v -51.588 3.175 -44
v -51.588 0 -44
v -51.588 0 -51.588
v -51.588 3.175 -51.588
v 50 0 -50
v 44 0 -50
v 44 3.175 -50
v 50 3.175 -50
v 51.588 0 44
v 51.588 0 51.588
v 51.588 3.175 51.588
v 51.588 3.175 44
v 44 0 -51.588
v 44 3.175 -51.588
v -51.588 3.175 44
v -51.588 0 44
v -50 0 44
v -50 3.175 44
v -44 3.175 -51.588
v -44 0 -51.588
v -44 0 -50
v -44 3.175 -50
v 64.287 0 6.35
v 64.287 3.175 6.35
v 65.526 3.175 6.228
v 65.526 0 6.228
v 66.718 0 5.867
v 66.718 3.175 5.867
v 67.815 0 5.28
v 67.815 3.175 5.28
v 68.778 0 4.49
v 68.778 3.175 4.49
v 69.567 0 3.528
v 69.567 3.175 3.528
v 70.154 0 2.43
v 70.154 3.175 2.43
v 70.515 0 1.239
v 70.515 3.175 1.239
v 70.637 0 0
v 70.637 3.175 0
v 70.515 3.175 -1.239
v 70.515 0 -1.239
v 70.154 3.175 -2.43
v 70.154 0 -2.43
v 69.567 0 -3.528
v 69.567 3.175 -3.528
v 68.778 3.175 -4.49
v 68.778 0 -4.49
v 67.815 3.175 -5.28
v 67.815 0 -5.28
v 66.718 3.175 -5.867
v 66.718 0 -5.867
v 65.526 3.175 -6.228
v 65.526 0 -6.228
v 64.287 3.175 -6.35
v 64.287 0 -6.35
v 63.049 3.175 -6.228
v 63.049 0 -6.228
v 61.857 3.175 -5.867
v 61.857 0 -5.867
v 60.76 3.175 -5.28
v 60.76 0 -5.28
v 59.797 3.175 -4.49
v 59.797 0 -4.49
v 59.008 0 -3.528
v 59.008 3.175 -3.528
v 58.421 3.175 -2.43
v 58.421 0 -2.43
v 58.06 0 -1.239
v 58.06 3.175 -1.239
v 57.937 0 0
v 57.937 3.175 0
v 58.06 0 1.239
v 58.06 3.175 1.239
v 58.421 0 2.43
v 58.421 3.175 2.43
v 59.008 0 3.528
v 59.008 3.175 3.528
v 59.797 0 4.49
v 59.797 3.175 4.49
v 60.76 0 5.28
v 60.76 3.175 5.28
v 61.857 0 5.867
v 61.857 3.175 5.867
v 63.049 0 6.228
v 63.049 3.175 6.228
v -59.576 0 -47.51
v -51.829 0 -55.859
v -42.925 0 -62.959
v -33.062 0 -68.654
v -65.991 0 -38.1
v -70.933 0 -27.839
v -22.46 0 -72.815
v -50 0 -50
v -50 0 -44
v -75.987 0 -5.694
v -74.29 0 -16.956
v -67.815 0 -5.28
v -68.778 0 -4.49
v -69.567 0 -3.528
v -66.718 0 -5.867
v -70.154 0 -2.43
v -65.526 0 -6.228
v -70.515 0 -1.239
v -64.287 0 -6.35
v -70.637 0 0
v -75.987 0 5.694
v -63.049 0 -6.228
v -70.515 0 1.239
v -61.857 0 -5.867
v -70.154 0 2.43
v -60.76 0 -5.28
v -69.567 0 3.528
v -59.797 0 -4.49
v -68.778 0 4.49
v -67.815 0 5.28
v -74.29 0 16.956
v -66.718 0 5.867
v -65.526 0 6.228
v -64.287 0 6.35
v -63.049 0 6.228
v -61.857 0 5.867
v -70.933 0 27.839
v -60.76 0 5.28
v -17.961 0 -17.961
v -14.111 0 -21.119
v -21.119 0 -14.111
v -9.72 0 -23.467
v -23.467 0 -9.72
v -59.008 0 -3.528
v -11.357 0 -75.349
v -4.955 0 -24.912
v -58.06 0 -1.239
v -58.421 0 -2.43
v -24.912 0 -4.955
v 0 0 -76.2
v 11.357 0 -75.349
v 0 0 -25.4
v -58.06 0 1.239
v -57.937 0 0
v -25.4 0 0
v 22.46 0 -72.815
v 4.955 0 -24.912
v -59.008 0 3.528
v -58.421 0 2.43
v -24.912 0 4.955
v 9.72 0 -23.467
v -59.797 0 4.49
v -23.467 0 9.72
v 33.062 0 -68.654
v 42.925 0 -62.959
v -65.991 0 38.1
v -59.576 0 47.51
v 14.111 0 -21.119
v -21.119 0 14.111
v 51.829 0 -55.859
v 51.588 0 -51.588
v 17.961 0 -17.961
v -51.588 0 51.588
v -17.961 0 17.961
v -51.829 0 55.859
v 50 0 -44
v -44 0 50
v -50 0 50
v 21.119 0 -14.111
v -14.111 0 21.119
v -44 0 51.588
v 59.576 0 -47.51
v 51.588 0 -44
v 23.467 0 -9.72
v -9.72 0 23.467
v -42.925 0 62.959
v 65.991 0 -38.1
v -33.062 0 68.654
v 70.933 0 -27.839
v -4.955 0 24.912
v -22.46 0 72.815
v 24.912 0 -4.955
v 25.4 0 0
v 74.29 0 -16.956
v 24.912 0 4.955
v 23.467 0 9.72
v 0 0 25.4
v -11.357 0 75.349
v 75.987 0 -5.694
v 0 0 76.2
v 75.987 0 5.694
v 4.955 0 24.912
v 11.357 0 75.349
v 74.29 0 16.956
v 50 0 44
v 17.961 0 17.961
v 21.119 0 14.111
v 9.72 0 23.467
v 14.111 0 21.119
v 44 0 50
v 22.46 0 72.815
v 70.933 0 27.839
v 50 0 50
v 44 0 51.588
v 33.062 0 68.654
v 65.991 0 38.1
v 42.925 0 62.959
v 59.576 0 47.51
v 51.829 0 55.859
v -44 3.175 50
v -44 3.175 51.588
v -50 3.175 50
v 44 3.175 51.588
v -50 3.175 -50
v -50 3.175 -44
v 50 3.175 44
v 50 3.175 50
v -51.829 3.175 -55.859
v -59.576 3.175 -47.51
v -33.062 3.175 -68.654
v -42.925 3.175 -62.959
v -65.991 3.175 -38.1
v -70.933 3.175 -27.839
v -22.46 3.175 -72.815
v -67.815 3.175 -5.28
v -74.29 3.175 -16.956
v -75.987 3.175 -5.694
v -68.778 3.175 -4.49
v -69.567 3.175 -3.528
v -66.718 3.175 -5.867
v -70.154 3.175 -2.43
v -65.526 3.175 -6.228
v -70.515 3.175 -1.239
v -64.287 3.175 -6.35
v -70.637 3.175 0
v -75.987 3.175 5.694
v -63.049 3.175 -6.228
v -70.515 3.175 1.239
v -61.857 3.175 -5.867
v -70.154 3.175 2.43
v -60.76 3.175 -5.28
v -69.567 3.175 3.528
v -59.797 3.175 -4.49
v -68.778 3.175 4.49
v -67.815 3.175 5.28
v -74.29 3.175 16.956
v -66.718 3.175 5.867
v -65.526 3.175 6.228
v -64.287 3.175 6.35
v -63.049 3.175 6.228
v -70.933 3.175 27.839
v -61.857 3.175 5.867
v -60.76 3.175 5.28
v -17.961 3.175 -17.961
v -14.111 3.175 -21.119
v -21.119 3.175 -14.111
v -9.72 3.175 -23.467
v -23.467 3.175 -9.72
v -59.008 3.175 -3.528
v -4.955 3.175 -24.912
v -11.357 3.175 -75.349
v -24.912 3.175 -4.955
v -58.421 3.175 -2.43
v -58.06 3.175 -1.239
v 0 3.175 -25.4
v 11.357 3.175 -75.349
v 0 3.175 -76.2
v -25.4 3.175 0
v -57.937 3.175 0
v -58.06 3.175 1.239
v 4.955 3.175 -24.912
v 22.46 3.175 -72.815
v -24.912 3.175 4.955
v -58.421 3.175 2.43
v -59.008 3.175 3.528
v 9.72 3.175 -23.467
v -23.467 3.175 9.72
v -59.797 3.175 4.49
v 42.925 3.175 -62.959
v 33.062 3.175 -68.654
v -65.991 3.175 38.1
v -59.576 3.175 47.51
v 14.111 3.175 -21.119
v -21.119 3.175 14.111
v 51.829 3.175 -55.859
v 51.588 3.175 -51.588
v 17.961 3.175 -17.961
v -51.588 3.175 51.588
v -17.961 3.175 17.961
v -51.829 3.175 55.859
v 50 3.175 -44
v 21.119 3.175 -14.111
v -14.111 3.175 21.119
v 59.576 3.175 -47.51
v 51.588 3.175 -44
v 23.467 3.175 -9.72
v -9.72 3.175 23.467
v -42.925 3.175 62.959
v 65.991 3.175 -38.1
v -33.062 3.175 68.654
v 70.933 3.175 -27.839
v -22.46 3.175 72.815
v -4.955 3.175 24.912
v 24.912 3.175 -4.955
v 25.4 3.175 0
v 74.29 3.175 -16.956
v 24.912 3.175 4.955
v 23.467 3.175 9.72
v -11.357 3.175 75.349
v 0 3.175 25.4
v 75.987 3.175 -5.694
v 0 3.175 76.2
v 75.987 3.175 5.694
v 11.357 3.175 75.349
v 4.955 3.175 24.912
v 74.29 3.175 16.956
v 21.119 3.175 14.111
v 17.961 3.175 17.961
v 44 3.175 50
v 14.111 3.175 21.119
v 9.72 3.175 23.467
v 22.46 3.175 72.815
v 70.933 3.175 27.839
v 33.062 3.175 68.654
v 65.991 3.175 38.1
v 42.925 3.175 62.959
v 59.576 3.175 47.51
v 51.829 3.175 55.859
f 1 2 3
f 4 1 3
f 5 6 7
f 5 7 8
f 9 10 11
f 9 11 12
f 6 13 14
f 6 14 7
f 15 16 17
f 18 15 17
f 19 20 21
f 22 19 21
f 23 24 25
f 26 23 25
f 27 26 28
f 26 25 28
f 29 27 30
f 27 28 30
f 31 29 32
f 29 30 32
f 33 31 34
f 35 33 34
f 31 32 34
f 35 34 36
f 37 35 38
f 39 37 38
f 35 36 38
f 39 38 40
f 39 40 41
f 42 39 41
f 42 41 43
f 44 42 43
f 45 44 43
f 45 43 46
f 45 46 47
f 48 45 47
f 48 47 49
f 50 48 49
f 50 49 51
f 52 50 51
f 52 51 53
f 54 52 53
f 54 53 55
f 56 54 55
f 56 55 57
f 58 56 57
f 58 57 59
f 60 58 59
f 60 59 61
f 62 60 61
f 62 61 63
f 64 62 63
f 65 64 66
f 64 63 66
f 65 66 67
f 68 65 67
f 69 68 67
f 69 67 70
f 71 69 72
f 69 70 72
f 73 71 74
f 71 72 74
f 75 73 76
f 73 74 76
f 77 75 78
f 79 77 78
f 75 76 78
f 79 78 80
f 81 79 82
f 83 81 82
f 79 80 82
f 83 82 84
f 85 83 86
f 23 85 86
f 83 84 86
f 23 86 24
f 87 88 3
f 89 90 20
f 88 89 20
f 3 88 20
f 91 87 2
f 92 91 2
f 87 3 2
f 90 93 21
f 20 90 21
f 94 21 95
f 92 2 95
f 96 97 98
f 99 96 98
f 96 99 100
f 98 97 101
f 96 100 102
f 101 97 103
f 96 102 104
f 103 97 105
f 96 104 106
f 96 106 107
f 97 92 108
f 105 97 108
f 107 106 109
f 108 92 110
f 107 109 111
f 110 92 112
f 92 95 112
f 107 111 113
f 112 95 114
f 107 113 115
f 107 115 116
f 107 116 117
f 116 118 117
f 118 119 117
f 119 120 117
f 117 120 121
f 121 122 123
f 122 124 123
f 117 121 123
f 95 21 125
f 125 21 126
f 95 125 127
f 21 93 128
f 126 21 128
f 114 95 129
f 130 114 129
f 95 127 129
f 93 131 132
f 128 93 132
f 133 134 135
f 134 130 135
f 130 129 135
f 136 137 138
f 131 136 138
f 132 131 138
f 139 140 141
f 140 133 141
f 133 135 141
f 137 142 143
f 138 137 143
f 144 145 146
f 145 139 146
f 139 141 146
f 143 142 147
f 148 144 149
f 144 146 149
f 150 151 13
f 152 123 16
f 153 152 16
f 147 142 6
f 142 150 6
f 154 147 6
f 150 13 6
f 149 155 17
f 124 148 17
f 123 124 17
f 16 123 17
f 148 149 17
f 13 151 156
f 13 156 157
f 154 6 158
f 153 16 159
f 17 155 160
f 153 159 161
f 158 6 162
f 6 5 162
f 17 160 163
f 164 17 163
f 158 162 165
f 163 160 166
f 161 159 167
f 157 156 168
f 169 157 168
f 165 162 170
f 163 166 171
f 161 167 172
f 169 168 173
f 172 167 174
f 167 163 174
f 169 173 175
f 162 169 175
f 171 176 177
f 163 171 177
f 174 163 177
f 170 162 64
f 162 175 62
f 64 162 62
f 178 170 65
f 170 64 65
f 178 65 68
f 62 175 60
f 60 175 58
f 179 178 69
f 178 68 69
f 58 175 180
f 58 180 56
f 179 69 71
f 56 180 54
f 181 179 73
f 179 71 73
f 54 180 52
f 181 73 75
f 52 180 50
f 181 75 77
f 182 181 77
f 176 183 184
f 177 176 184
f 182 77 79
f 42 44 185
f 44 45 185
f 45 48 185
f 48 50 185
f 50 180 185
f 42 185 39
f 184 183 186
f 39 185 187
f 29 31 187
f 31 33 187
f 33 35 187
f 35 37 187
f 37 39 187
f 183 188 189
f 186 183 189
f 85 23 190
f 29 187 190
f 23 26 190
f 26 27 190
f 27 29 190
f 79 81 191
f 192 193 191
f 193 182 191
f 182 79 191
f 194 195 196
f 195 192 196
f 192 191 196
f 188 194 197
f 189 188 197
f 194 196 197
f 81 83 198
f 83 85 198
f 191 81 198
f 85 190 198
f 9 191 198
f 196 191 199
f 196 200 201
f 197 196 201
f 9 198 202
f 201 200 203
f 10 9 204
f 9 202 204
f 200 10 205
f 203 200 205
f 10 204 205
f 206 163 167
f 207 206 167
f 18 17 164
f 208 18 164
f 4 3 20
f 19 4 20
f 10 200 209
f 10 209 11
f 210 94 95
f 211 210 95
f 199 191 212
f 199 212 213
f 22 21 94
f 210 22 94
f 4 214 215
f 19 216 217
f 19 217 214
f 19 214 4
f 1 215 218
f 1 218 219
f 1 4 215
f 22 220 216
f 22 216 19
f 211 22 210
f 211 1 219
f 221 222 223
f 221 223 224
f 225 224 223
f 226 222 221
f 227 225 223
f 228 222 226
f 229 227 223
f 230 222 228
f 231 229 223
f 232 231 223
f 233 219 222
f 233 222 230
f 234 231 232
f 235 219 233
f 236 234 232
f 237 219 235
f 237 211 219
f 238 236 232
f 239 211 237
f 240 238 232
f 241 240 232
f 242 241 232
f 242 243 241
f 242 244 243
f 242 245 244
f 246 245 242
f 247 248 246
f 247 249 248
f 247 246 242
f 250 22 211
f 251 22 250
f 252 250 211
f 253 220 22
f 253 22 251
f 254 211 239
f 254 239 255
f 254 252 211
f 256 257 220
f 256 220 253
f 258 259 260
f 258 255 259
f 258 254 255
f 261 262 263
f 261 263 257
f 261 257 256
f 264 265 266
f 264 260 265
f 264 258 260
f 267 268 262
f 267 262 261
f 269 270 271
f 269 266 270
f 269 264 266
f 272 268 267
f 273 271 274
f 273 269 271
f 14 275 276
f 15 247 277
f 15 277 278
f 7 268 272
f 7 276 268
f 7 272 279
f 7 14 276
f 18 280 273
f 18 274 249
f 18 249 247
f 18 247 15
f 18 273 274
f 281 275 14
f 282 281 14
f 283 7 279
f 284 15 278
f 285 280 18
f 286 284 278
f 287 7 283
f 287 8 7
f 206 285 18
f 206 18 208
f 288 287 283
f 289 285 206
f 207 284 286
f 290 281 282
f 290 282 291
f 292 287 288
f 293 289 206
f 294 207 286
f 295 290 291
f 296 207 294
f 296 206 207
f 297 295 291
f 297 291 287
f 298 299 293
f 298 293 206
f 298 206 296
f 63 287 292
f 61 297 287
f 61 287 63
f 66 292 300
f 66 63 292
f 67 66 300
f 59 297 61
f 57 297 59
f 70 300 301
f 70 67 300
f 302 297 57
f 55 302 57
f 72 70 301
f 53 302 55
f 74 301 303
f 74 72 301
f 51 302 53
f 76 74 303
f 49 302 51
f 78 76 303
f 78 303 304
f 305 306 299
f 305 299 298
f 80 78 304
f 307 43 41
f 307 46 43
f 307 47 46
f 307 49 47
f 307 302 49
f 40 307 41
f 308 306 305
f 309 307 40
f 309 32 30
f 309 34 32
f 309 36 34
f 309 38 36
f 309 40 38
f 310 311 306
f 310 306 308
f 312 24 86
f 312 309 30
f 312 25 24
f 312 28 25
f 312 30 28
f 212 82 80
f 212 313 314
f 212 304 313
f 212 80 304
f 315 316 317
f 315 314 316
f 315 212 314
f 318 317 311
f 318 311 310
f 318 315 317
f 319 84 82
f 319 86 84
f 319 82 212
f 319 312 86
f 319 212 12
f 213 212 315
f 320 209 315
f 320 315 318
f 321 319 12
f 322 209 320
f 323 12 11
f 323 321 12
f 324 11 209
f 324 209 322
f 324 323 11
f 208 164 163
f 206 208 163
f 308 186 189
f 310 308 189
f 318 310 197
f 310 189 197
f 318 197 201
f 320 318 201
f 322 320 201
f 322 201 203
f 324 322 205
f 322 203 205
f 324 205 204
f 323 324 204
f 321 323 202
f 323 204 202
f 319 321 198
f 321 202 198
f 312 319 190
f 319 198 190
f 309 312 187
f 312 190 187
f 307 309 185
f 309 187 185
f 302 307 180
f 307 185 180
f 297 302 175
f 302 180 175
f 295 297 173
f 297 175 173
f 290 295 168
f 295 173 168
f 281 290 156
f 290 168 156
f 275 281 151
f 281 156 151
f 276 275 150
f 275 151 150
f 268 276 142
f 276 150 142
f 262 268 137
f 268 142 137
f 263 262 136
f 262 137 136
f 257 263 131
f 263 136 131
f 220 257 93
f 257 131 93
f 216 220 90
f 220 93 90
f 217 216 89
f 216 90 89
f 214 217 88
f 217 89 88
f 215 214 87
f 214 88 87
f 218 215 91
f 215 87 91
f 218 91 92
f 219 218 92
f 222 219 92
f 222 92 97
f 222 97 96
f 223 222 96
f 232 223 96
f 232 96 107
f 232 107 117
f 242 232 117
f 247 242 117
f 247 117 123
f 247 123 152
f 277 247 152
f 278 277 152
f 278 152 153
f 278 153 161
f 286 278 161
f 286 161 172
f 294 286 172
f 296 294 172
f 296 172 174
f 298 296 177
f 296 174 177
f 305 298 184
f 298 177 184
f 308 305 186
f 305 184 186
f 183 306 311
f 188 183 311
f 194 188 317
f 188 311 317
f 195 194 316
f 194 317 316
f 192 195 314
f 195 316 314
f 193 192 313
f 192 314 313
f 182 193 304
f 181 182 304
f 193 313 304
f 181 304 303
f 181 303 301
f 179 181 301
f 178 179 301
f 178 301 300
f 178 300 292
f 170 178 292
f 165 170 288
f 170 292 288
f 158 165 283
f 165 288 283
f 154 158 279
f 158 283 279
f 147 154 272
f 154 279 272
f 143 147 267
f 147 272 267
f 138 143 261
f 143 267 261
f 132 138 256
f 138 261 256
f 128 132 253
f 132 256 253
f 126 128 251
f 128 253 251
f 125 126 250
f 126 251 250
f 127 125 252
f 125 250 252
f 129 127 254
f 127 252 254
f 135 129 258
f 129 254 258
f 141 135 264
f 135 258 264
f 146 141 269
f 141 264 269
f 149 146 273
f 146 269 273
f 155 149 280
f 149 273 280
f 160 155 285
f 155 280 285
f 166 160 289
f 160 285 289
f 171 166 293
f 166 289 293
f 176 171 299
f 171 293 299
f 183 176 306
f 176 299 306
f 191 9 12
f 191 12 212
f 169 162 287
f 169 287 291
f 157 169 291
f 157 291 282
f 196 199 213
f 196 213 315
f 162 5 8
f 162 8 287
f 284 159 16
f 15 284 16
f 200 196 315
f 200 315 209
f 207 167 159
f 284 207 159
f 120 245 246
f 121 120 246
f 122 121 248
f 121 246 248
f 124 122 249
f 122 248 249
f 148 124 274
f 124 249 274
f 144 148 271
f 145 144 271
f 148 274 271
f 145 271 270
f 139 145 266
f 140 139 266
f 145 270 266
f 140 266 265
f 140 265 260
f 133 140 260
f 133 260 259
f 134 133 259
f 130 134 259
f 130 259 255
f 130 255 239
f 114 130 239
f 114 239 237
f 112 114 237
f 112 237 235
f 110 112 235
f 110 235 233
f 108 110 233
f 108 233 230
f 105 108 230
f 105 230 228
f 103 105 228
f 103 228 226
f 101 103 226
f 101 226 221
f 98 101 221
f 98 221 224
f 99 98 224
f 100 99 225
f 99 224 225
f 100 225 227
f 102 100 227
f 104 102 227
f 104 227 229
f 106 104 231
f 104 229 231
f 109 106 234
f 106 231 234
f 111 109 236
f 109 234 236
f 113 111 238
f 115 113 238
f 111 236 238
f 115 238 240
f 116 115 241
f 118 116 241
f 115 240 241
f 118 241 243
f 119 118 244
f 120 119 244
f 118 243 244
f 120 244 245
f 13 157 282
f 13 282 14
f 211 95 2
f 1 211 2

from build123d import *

# Parameters (mm, degrees)
SKETCH1_R           = 76.2
BOSS_EXTRUDE1_DEPTH = 3.175
SKETCH2_R           = 25.4
CUT_EXTRUDE1_DEPTH  = 3.175
SKETCH3_R           = 6.35
CUT_EXTRUDE2_DEPTH  = 10


with BuildPart() as part:
    # Sketch1 → Boss-Extrude1 (new body)
    with BuildSketch(Plane(origin=(0, 0, 0), x_dir=(1, 0, 0), z_dir=(0, 1, 0))):
        with Locations(Location((0, 0, 0), (0, 0, 270))):
            Circle(SKETCH1_R)
        Polygon((-50, 50), (-50, 44), (-51.5875, 44), (-51.5875, 51.5875), (-44, 51.5875), (-44, 50), align=None, mode=Mode.SUBTRACT)
        Polygon((51.5875, -44), (50, -44), (50, -50), (44, -50), (44, -51.5875), (51.5875, -51.5875), align=None, mode=Mode.SUBTRACT)
        Polygon((-50, -50), (-44, -50), (-44, -51.5875), (-51.5875, -51.5875), (-51.5875, -44), (-50, -44), align=None, mode=Mode.SUBTRACT)
        Polygon((51.5875, 51.5875), (44, 51.5875), (44, 50), (50, 50), (50, 44), (51.5875, 44), align=None, mode=Mode.SUBTRACT)
    extrude(amount=BOSS_EXTRUDE1_DEPTH)

    # Sketch2 → Cut-Extrude1 (cut)
    with BuildSketch(Plane(origin=(0, 3.175, 0), x_dir=(1, 0, 0), z_dir=(0, 1, 0))):
        with Locations(Location((0, 0, 0), (0, 0, 270))):
            Circle(SKETCH2_R)
    extrude(amount=-CUT_EXTRUDE1_DEPTH, mode=Mode.SUBTRACT)

    # Sketch3 → Cut-Extrude2 (cut)
    with BuildSketch(Plane(origin=(0, 3.175, 0), x_dir=(1, 0, 0), z_dir=(0, 1, 0))):
        with Locations(Location((-64.2875, 0, 0), (0, 0, 270))):
            Circle(SKETCH3_R)
        with Locations(Location((64.2875, 0, 0), (0, 0, 270))):
            Circle(SKETCH3_R)
    extrude(amount=-CUT_EXTRUDE2_DEPTH, mode=Mode.SUBTRACT)


solid = part.part
